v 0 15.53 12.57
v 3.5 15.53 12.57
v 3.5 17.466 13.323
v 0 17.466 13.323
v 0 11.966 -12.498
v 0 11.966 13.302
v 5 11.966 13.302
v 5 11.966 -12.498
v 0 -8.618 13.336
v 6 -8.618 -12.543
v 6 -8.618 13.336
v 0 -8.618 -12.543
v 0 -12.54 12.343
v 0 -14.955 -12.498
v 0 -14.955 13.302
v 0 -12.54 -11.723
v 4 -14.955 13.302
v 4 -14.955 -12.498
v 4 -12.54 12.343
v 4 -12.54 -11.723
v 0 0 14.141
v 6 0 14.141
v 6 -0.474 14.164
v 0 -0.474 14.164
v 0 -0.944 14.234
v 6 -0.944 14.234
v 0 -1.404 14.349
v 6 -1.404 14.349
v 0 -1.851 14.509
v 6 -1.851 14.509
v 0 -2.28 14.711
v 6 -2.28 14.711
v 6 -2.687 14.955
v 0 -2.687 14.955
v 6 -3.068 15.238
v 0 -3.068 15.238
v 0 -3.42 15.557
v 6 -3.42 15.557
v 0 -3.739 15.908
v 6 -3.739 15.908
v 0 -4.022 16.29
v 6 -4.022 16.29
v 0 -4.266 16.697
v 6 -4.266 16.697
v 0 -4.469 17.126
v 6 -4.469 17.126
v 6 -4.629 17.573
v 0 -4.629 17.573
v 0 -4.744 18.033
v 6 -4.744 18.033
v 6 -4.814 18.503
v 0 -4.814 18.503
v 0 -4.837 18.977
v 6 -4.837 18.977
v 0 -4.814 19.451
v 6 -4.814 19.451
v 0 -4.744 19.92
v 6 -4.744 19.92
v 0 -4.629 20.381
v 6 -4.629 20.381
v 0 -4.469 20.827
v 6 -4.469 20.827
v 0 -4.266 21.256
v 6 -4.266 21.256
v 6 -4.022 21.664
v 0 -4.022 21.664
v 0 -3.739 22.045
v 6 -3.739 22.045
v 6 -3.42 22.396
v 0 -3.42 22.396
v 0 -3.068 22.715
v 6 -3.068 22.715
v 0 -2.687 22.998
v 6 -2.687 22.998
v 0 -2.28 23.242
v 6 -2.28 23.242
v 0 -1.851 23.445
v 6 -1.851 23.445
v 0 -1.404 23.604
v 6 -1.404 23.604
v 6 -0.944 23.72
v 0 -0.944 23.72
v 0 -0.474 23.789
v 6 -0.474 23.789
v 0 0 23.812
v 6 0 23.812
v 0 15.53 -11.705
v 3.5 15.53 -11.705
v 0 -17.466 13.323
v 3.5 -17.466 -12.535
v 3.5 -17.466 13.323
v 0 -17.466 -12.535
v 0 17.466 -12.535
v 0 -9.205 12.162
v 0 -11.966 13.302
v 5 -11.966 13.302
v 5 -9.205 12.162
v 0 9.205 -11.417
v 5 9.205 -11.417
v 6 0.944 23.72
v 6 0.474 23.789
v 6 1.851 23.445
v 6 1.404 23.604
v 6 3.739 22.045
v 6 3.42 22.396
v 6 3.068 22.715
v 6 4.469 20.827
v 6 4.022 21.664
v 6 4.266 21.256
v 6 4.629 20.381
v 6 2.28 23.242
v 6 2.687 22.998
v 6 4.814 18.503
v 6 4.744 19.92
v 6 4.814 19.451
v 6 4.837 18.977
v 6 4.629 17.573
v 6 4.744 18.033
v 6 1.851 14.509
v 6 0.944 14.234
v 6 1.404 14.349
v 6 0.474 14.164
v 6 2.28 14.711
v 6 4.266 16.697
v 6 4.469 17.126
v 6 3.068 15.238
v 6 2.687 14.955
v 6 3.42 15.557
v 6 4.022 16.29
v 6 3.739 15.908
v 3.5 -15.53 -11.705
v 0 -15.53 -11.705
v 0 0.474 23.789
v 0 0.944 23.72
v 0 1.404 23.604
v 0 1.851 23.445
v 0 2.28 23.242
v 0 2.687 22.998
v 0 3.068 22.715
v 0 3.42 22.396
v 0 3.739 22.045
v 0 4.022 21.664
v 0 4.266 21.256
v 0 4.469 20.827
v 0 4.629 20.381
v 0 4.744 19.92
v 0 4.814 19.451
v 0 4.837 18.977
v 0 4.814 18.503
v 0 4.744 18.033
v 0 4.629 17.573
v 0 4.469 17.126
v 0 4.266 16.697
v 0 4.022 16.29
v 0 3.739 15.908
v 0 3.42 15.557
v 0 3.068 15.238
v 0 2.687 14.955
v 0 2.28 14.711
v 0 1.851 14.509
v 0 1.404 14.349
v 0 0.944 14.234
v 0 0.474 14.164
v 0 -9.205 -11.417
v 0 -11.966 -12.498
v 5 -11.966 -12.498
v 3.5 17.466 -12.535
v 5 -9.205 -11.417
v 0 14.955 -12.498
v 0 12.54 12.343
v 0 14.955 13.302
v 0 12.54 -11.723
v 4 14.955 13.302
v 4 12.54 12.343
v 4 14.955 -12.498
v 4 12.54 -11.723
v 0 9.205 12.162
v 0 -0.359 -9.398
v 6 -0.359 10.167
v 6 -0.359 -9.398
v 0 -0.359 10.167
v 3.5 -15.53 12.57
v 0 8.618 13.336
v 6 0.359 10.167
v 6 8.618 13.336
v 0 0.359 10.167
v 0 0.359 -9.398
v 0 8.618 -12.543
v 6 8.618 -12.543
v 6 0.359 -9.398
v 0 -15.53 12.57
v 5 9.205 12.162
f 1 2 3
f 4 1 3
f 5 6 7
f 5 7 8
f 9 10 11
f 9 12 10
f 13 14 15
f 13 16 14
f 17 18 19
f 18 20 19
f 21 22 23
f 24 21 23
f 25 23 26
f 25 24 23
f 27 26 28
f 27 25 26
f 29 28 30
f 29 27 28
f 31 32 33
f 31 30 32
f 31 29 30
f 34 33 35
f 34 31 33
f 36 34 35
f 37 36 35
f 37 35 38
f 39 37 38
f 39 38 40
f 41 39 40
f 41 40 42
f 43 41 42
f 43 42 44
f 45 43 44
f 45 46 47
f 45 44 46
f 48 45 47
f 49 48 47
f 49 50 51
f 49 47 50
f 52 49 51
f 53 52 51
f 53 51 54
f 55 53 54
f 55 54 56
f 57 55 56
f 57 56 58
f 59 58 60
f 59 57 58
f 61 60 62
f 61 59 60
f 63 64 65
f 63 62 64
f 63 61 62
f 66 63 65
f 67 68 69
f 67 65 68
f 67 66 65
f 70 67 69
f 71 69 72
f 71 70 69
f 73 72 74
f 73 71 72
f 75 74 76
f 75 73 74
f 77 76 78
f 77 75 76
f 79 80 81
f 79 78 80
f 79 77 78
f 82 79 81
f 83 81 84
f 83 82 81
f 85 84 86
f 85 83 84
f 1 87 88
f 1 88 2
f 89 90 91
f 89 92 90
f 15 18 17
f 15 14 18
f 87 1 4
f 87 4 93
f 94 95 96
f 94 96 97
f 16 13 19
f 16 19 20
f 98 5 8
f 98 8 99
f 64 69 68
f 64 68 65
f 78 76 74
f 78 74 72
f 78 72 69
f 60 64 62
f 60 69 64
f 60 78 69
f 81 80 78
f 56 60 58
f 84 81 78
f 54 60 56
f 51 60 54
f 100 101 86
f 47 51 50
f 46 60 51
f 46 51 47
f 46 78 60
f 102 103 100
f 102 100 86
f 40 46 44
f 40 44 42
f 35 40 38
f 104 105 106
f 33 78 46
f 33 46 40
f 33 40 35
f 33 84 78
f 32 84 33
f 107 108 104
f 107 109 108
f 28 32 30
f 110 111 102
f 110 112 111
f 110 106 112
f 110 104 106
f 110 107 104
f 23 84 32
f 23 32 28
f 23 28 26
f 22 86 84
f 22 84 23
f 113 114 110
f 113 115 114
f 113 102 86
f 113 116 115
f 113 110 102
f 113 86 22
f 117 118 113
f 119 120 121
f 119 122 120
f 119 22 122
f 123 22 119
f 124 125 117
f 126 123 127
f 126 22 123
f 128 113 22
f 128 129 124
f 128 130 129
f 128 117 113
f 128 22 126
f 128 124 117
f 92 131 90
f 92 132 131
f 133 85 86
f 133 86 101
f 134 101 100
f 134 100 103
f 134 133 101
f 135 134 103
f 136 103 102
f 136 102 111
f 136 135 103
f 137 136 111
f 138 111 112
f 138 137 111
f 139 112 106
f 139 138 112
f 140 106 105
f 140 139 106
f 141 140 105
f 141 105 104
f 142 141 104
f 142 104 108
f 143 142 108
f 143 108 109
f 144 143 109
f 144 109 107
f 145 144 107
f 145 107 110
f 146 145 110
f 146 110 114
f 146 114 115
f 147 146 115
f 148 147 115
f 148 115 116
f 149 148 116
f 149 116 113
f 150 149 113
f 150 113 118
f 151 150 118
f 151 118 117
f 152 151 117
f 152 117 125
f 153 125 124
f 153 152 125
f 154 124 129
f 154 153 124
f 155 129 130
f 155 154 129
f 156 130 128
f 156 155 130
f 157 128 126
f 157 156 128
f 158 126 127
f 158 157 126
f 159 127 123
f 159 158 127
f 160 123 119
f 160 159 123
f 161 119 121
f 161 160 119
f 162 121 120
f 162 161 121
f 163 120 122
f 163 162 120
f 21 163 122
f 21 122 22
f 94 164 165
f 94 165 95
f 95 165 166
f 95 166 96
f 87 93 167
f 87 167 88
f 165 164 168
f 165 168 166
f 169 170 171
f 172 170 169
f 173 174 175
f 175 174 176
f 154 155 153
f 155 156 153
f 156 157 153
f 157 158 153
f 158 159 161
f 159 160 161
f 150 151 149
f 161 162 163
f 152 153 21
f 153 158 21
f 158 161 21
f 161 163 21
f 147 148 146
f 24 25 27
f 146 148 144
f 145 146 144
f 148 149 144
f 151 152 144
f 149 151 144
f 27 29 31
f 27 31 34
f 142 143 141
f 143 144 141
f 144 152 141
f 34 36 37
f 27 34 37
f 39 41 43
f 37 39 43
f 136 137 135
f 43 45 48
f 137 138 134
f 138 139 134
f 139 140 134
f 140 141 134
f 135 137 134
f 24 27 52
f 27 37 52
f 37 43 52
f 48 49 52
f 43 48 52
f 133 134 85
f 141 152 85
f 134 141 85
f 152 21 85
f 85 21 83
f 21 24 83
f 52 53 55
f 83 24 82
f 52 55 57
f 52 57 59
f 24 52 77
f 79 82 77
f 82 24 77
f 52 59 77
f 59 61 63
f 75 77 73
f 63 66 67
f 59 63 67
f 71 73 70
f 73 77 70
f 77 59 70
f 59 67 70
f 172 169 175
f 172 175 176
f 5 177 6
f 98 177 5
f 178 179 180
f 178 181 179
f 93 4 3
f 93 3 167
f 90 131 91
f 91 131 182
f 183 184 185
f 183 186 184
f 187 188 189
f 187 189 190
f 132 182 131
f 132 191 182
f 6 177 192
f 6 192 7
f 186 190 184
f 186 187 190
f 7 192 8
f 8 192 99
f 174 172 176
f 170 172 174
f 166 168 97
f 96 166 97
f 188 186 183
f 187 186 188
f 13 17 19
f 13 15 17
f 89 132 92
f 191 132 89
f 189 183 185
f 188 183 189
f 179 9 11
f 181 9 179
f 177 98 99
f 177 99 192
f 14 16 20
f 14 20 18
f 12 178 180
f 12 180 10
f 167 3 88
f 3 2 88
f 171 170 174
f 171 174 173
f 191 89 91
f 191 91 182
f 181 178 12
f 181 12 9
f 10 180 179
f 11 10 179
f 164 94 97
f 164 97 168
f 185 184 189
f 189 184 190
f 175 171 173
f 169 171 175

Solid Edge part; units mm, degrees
sketch "Sketch1" plane through (0, 0, 0) normal (1, 0, 0) x (0, 1, 0)
  circle A0 centre (-0.001, 18.9766) radius 4.8358
  line L0 (0.3592, -9.398) -> (0.3592, 10.1673)
  line L1 (0.3592, 10.1673) -> (8.6179, 13.3364)
  line L2 (8.6179, 13.3364) -> (8.6179, -12.543)
  line L3 (8.6179, -12.543) -> (0.3592, -9.398)
extrude "Protrusion1" add sketch "Sketch1" along normal blind 6
sketch "Sketch2" plane through (0, 0, 0) normal (1, 0, 0) x (0, 1, 0)
  line L0 (9.2052, -11.4174) -> (9.2052, 12.1618)
  line L1 (9.2052, 12.1618) -> (11.9661, 13.3022)
  line L2 (11.9661, 13.3022) -> (11.9661, -12.4977)
  line L3 (11.9661, -12.4977) -> (9.2052, -11.4174)
extrude "ExtrudedProtrusion_8" add sketch "Sketch2" along normal blind 5
sketch "Sketch3" plane through (0, 0, 0) normal (1, 0, 0) x (0, 1, 0)
  line L0 (14.9546, 13.3022) -> (14.9546, -12.4977)
  line L1 (14.9546, -12.4977) -> (12.5397, -11.723)
  line L2 (12.5397, -11.723) -> (12.5397, 12.3432)
  line L3 (12.5397, 12.3432) -> (14.9546, 13.3022)
extrude "ExtrudedProtrusion_9" add sketch "Sketch3" along normal blind 4
sketch "Sketch4" plane through (0, 0, 0) normal (1, 0, 0) x (0, 1, 0)
  line L0 (15.5302, -11.705) -> (15.5302, 12.5703)
  line L1 (15.5302, 12.5703) -> (17.4662, 13.3232)
  line L2 (17.4662, 13.3232) -> (17.4662, -12.5348)
  line L3 (17.4662, -12.5348) -> (15.5302, -11.705)
extrude "ExtrudedProtrusion_10" add sketch "Sketch4" along normal blind 3.5
mirror "Mirror1" about plane through (0, 0, 0) normal (0, -1, 0) of "Protrusion1", "ExtrudedProtrusion_8", "ExtrudedProtrusion_9", "ExtrudedProtrusion_10"
